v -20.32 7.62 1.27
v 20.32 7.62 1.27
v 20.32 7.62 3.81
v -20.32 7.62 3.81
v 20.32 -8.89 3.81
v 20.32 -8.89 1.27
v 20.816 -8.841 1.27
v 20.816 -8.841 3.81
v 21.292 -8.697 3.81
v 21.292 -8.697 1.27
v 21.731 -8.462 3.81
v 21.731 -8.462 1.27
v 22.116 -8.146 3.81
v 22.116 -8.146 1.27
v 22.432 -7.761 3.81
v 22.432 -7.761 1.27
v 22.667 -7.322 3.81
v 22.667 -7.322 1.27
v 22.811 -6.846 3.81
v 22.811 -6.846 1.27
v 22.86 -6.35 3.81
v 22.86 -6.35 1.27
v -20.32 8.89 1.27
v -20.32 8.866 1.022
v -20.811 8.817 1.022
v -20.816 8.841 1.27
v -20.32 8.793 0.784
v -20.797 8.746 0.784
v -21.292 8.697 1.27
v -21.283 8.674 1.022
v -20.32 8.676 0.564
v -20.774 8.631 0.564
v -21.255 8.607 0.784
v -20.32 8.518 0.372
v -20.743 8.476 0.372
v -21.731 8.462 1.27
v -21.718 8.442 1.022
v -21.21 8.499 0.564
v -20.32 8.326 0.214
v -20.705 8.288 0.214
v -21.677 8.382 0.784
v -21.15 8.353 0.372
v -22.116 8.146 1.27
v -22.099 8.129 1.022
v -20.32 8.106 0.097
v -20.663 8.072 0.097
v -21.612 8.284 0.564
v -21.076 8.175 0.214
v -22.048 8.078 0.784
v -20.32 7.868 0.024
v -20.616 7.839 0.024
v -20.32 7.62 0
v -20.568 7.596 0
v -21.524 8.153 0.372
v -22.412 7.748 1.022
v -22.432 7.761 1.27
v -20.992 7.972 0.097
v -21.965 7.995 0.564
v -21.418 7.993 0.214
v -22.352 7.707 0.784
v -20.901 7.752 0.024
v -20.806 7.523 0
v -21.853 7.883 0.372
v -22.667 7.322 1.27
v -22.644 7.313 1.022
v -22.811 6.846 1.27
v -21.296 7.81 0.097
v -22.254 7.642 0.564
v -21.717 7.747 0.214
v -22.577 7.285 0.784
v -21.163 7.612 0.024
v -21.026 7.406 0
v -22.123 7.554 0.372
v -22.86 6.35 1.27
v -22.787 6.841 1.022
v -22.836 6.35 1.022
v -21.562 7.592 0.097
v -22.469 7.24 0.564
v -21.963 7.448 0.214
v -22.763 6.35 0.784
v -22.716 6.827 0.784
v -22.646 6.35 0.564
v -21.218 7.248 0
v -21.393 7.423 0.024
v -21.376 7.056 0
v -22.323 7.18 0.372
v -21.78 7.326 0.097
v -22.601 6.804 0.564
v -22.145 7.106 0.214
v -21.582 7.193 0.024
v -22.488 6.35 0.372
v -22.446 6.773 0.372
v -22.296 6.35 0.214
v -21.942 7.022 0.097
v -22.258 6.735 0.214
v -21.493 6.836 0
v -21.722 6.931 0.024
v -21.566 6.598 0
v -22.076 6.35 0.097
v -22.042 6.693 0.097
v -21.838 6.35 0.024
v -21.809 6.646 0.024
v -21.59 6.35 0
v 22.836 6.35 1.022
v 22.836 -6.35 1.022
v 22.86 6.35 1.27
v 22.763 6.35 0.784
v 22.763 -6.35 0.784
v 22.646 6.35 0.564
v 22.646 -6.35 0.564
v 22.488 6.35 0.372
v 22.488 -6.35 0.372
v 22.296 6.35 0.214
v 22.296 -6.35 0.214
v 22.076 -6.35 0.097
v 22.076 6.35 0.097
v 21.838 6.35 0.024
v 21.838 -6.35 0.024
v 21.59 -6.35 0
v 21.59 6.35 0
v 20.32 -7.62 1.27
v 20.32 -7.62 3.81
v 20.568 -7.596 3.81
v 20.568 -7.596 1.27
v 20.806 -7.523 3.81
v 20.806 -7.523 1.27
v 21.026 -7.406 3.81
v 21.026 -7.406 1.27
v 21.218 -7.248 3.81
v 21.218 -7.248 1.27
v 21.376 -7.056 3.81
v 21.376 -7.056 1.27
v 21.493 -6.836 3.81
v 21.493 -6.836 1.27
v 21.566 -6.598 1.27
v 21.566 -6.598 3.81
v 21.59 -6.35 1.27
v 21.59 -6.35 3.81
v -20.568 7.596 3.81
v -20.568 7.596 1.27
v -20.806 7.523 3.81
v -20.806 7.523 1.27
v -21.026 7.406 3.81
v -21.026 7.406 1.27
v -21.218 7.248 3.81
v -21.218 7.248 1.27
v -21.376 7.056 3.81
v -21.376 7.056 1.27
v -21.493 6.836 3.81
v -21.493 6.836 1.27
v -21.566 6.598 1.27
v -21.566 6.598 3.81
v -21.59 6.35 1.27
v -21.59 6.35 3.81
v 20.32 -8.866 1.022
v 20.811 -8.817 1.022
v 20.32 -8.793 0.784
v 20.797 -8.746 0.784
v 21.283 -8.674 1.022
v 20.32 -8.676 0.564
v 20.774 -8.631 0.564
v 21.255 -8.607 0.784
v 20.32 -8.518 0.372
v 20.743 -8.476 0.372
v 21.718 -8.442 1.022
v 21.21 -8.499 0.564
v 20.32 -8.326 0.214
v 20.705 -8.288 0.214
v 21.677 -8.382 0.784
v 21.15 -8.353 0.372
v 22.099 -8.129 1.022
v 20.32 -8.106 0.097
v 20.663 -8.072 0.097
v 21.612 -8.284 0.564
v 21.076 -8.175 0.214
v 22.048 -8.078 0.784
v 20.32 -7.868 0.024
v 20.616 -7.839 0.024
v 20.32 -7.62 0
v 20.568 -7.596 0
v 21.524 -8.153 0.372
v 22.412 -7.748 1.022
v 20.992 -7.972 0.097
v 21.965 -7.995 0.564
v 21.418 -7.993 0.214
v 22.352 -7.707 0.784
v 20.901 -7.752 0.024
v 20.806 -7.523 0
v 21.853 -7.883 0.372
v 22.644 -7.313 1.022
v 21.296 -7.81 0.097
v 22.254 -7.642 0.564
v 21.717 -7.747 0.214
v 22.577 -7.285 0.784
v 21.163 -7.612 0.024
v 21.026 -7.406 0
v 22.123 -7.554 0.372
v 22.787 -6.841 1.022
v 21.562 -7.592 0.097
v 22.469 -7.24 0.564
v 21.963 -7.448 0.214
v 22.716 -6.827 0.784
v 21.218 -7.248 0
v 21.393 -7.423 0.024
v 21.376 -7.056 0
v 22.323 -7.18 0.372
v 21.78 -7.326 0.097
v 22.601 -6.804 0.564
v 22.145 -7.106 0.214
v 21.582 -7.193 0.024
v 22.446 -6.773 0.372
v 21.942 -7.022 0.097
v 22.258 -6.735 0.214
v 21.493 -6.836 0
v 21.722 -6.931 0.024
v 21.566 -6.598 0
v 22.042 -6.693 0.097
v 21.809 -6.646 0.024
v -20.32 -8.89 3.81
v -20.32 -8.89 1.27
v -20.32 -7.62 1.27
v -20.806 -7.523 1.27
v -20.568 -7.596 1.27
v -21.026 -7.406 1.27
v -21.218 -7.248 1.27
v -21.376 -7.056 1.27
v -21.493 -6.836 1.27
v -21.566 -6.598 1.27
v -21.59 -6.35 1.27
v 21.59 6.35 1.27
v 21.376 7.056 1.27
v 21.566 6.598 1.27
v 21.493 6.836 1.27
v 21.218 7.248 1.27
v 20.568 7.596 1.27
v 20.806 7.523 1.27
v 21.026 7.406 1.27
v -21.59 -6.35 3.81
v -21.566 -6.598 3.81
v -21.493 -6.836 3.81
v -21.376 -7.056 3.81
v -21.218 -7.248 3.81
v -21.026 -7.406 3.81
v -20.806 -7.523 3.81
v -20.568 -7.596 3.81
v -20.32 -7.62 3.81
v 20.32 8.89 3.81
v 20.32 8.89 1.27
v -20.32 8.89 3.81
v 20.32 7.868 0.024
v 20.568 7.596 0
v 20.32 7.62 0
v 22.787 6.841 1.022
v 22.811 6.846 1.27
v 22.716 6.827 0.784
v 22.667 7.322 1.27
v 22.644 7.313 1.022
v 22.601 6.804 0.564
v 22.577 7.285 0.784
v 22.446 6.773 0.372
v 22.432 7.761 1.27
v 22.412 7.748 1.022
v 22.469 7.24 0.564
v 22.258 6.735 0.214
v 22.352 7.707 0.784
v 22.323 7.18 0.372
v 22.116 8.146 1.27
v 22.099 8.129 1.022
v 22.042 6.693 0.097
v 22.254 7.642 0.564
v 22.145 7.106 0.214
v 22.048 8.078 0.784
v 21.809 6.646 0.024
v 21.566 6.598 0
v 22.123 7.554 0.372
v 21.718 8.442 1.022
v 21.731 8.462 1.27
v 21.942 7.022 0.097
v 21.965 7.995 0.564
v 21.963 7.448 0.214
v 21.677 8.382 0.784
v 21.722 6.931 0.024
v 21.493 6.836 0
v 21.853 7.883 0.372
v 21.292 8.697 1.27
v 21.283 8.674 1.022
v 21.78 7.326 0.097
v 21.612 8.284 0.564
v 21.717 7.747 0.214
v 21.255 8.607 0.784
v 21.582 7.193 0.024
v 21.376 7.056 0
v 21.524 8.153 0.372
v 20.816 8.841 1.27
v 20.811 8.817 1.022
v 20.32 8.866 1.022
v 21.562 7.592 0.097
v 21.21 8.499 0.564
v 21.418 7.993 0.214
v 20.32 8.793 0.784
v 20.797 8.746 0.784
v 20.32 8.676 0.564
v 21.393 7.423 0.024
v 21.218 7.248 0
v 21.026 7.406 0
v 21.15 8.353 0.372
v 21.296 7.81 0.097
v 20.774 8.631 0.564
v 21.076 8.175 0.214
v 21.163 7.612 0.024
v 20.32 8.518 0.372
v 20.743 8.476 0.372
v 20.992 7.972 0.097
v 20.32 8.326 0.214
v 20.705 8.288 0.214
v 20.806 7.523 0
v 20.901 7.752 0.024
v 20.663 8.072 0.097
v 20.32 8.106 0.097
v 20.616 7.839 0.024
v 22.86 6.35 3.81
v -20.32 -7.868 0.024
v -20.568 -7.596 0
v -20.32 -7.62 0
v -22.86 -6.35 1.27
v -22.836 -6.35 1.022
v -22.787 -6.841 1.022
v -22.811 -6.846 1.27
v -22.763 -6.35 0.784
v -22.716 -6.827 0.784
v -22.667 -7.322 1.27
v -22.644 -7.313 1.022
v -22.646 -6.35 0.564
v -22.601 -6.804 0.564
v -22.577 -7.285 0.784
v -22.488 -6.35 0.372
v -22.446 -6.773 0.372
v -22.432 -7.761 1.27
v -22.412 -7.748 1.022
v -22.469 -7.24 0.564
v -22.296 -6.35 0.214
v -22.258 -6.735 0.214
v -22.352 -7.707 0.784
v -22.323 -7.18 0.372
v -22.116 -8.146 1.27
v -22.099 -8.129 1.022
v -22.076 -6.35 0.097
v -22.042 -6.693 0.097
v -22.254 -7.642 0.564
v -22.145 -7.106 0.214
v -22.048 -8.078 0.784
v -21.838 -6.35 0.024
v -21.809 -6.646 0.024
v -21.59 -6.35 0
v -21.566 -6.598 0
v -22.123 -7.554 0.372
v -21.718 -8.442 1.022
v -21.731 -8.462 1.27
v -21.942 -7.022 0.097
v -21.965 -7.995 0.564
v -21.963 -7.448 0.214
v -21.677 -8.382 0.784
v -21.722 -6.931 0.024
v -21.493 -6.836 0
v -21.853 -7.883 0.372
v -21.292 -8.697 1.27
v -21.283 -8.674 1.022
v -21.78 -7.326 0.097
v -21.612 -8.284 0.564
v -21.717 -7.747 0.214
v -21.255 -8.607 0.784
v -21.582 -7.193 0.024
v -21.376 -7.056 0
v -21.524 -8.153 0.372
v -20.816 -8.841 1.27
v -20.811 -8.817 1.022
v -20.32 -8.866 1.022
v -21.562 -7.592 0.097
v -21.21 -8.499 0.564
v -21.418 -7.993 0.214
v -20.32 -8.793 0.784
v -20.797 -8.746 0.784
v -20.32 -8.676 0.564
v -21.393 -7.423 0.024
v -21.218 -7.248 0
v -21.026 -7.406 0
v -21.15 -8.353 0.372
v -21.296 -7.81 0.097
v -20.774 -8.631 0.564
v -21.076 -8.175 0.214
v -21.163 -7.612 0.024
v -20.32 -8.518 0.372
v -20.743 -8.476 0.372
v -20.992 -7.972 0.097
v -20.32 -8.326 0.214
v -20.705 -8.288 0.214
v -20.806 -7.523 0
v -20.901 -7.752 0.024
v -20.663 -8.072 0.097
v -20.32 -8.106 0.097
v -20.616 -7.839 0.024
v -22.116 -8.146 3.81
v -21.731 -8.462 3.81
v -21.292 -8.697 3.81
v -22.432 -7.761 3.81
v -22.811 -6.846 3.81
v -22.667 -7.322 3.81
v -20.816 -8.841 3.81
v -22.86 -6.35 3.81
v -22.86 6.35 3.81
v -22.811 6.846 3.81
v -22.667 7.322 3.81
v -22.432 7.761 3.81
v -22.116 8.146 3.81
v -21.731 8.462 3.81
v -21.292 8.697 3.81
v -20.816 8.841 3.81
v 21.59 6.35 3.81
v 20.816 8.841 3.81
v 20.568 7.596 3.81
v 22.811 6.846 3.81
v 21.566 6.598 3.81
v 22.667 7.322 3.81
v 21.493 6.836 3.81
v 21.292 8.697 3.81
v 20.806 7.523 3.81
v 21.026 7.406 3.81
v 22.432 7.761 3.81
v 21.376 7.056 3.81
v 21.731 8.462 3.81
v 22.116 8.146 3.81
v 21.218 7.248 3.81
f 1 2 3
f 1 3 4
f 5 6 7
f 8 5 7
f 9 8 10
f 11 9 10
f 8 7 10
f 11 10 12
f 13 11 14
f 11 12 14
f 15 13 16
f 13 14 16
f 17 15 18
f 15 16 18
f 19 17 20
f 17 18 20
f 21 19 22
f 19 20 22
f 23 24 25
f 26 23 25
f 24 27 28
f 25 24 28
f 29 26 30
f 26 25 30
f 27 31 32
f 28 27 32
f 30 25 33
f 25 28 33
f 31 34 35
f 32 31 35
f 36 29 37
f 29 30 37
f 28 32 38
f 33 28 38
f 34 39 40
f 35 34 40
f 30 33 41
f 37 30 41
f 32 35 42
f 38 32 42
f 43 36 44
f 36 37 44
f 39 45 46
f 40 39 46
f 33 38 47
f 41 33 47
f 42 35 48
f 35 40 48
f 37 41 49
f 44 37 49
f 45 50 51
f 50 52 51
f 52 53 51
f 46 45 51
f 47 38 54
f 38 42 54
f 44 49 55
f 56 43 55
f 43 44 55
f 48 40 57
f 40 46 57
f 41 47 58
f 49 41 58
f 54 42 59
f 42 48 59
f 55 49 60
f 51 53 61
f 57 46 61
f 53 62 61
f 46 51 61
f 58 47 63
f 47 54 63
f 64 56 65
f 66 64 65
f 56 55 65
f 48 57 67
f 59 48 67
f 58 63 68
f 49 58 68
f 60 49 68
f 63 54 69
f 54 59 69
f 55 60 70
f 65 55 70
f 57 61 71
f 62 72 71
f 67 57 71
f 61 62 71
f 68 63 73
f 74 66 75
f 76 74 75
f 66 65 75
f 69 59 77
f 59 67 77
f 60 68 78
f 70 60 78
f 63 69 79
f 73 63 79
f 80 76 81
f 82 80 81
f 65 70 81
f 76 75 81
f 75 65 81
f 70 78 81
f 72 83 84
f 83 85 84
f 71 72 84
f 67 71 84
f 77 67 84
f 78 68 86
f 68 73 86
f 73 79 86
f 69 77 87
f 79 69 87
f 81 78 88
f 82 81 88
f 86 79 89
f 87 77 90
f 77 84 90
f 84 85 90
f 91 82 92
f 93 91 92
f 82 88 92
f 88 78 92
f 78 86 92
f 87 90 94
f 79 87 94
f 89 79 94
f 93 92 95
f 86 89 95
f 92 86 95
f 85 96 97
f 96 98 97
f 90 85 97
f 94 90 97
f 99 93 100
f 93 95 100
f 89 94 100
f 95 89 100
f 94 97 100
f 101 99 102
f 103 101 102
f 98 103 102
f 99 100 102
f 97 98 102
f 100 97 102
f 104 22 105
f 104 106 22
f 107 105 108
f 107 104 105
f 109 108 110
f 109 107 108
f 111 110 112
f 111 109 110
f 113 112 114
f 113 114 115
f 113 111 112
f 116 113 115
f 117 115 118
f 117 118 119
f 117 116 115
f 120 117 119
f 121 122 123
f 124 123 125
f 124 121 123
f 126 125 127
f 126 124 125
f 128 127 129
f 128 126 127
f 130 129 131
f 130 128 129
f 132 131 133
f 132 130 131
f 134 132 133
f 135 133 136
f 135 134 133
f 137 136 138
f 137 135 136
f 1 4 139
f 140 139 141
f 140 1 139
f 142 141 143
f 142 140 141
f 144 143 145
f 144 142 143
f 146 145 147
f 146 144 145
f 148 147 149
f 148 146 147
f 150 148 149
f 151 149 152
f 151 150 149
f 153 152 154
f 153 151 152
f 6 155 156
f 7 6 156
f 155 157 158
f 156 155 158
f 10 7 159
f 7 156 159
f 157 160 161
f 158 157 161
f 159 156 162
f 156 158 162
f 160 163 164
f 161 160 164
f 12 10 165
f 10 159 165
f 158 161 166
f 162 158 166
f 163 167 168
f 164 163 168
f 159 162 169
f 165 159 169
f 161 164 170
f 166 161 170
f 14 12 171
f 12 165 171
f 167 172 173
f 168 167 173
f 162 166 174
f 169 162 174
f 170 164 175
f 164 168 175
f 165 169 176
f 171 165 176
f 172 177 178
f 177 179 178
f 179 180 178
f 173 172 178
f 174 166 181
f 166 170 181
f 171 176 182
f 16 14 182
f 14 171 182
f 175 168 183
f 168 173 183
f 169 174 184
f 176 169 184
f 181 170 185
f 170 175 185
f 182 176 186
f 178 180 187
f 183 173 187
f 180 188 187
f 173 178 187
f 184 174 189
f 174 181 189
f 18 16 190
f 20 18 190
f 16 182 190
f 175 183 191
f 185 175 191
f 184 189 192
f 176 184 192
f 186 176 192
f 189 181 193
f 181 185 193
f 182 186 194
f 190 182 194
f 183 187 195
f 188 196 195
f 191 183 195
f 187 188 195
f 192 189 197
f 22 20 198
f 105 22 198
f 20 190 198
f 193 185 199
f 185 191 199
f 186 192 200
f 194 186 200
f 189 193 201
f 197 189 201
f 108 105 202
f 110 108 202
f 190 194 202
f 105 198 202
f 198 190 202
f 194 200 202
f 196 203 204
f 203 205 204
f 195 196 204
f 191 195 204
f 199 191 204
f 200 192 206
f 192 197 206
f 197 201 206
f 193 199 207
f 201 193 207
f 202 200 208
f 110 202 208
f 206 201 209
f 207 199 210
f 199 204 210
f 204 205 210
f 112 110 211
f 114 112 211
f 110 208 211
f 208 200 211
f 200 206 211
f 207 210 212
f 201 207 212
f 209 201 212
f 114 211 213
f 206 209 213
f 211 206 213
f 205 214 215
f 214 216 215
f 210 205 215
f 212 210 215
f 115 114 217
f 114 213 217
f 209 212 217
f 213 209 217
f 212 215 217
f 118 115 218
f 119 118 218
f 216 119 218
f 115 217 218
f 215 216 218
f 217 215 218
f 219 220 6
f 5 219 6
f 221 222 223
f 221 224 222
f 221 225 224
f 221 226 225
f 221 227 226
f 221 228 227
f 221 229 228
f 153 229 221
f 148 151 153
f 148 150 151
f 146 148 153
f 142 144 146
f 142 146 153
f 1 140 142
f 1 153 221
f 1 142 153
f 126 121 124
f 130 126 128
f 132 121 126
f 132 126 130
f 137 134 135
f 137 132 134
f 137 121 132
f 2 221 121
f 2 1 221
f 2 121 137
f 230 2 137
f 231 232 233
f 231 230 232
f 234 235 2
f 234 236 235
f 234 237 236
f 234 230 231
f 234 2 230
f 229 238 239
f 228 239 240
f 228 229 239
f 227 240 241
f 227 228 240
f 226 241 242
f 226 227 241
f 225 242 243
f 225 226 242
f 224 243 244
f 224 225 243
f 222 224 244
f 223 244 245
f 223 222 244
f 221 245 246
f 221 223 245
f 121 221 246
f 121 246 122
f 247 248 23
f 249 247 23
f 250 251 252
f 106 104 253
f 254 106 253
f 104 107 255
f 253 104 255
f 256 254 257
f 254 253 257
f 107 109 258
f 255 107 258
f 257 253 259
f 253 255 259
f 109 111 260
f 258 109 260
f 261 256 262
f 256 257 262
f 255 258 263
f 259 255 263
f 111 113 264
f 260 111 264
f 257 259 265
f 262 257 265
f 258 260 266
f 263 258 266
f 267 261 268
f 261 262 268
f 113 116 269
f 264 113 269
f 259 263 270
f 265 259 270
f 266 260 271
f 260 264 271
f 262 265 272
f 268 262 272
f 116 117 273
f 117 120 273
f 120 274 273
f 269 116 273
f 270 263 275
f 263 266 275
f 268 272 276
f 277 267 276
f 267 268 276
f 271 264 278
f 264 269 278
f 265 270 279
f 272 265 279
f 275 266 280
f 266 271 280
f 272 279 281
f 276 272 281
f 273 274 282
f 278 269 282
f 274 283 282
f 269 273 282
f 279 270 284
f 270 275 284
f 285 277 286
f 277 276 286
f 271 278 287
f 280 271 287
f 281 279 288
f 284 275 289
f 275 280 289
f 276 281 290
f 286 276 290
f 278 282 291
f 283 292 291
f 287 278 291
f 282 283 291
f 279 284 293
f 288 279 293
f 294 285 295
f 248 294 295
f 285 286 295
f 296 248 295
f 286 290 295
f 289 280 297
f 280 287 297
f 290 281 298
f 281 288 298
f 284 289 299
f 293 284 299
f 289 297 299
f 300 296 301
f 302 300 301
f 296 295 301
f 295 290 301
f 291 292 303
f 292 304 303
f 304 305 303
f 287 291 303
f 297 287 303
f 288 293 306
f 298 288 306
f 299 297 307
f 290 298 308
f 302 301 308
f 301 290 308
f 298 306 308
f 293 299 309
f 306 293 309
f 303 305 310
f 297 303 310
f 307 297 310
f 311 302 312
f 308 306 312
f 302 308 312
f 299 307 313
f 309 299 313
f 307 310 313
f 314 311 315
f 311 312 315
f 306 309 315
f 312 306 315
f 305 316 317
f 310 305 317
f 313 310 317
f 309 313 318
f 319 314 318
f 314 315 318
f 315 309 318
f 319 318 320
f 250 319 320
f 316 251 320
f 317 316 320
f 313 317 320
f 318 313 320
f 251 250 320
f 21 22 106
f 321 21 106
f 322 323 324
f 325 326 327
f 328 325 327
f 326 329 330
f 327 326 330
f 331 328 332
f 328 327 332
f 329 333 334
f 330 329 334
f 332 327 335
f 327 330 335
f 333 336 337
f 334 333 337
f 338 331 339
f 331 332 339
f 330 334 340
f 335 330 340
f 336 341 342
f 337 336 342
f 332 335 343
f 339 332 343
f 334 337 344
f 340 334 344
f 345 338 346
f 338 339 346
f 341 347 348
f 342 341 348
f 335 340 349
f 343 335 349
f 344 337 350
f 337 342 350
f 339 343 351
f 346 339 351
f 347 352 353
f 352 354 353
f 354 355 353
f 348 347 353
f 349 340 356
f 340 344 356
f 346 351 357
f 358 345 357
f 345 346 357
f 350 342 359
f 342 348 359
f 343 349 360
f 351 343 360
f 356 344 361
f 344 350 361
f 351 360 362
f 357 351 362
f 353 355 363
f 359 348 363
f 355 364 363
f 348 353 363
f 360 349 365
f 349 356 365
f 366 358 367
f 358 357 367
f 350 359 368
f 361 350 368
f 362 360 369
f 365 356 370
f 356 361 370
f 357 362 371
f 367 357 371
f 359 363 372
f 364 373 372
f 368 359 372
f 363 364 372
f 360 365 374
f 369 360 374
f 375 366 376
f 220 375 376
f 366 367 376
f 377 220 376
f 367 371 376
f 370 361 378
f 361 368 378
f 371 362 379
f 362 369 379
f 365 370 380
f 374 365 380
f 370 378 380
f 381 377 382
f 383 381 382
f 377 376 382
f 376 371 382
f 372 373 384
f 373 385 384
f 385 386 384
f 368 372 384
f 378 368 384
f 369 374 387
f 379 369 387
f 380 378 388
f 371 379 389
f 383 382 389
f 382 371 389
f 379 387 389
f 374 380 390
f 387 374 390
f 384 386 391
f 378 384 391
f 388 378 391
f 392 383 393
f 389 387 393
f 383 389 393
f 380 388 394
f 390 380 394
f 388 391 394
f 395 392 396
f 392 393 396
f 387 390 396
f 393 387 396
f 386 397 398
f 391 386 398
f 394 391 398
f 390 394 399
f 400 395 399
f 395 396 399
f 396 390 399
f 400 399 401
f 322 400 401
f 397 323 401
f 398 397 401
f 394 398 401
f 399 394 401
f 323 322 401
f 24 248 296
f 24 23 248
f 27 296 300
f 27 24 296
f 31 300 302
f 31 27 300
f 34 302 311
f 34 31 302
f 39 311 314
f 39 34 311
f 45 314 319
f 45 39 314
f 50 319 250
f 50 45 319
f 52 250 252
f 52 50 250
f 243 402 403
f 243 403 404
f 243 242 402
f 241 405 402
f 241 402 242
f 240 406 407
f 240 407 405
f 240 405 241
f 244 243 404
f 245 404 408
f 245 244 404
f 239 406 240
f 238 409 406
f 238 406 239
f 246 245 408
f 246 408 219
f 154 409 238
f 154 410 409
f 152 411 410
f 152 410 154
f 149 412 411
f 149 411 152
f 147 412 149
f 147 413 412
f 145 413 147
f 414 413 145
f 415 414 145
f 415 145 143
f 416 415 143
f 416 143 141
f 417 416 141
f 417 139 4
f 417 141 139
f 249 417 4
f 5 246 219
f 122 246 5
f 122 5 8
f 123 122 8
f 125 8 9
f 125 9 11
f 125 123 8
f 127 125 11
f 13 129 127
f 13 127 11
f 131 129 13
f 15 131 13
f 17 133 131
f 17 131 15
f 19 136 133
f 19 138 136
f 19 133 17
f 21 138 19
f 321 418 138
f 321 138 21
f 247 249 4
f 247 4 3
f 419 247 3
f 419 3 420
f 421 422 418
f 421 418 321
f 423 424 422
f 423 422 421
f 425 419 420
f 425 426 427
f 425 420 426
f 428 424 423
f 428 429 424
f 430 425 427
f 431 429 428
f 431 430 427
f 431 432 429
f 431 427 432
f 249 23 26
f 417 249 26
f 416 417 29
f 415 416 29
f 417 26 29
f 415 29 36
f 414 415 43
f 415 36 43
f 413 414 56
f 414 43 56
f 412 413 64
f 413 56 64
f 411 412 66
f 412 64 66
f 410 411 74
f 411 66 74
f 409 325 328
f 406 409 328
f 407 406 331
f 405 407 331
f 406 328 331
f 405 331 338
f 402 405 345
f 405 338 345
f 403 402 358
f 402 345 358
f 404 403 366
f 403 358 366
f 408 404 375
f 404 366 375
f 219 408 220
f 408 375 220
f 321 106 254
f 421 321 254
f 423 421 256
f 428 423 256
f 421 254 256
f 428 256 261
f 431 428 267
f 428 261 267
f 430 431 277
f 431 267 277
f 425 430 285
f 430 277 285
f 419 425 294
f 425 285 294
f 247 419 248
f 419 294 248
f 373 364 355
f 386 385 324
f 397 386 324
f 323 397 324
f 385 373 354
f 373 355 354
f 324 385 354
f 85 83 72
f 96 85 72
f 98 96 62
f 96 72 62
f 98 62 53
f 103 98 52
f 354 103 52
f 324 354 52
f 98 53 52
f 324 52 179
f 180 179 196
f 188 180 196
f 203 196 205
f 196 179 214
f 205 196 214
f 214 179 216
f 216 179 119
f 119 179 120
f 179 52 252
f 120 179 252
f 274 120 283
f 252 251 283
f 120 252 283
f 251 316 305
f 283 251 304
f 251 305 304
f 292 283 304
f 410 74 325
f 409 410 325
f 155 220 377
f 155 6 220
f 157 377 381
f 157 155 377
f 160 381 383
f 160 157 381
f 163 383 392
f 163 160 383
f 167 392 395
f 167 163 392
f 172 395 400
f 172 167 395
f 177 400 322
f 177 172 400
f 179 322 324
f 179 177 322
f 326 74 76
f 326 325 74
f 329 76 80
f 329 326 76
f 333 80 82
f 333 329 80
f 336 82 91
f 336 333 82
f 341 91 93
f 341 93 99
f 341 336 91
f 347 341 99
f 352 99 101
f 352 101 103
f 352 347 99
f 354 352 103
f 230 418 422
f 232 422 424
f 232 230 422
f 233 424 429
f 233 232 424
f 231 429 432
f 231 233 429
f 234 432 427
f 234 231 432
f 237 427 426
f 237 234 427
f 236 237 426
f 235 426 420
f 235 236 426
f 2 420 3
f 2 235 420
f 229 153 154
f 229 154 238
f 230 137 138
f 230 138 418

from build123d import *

# Parameters (mm, degrees)
F1_DEPTH = 3.81
F2_T     = -1.27
F3_R     = 1.27


with BuildPart() as f1:
    # F0 (on Top) → F1 (new body)
    with BuildSketch(Plane.XY):
        with BuildLine():
            ThreePointArc((22.86, 6.35), (22.116051, 8.146051), (20.32, 8.89))
            Line((20.32, 8.89), (-20.32, 8.89))
            ThreePointArc((-20.32, 8.89), (-22.116051, 8.146051), (-22.86, 6.35))
            Line((-22.86, 6.35), (-22.86, -6.35))
            ThreePointArc((-22.86, -6.35), (-22.116051, -8.146051), (-20.32, -8.89))
            Line((-20.32, -8.89), (20.32, -8.89))
            ThreePointArc((20.32, -8.89), (22.116051, -8.146051), (22.86, -6.35))
            Line((22.86, -6.35), (22.86, 6.35))
        make_face()
    extrude(amount=F1_DEPTH)

    # F2
    f2_openings = [f1.faces().sort_by_distance(p)[0] for p in [
        (0, 0, 3.81),
    ]]
    offset(amount=F2_T, openings=f2_openings)

    # F3
    f3_edges = [f1.edges().sort_by_distance(p)[0] for p in [
        (0, -8.89, 0),
    ]]
    fillet(f3_edges, radius=F3_R)


solid = f1.part
